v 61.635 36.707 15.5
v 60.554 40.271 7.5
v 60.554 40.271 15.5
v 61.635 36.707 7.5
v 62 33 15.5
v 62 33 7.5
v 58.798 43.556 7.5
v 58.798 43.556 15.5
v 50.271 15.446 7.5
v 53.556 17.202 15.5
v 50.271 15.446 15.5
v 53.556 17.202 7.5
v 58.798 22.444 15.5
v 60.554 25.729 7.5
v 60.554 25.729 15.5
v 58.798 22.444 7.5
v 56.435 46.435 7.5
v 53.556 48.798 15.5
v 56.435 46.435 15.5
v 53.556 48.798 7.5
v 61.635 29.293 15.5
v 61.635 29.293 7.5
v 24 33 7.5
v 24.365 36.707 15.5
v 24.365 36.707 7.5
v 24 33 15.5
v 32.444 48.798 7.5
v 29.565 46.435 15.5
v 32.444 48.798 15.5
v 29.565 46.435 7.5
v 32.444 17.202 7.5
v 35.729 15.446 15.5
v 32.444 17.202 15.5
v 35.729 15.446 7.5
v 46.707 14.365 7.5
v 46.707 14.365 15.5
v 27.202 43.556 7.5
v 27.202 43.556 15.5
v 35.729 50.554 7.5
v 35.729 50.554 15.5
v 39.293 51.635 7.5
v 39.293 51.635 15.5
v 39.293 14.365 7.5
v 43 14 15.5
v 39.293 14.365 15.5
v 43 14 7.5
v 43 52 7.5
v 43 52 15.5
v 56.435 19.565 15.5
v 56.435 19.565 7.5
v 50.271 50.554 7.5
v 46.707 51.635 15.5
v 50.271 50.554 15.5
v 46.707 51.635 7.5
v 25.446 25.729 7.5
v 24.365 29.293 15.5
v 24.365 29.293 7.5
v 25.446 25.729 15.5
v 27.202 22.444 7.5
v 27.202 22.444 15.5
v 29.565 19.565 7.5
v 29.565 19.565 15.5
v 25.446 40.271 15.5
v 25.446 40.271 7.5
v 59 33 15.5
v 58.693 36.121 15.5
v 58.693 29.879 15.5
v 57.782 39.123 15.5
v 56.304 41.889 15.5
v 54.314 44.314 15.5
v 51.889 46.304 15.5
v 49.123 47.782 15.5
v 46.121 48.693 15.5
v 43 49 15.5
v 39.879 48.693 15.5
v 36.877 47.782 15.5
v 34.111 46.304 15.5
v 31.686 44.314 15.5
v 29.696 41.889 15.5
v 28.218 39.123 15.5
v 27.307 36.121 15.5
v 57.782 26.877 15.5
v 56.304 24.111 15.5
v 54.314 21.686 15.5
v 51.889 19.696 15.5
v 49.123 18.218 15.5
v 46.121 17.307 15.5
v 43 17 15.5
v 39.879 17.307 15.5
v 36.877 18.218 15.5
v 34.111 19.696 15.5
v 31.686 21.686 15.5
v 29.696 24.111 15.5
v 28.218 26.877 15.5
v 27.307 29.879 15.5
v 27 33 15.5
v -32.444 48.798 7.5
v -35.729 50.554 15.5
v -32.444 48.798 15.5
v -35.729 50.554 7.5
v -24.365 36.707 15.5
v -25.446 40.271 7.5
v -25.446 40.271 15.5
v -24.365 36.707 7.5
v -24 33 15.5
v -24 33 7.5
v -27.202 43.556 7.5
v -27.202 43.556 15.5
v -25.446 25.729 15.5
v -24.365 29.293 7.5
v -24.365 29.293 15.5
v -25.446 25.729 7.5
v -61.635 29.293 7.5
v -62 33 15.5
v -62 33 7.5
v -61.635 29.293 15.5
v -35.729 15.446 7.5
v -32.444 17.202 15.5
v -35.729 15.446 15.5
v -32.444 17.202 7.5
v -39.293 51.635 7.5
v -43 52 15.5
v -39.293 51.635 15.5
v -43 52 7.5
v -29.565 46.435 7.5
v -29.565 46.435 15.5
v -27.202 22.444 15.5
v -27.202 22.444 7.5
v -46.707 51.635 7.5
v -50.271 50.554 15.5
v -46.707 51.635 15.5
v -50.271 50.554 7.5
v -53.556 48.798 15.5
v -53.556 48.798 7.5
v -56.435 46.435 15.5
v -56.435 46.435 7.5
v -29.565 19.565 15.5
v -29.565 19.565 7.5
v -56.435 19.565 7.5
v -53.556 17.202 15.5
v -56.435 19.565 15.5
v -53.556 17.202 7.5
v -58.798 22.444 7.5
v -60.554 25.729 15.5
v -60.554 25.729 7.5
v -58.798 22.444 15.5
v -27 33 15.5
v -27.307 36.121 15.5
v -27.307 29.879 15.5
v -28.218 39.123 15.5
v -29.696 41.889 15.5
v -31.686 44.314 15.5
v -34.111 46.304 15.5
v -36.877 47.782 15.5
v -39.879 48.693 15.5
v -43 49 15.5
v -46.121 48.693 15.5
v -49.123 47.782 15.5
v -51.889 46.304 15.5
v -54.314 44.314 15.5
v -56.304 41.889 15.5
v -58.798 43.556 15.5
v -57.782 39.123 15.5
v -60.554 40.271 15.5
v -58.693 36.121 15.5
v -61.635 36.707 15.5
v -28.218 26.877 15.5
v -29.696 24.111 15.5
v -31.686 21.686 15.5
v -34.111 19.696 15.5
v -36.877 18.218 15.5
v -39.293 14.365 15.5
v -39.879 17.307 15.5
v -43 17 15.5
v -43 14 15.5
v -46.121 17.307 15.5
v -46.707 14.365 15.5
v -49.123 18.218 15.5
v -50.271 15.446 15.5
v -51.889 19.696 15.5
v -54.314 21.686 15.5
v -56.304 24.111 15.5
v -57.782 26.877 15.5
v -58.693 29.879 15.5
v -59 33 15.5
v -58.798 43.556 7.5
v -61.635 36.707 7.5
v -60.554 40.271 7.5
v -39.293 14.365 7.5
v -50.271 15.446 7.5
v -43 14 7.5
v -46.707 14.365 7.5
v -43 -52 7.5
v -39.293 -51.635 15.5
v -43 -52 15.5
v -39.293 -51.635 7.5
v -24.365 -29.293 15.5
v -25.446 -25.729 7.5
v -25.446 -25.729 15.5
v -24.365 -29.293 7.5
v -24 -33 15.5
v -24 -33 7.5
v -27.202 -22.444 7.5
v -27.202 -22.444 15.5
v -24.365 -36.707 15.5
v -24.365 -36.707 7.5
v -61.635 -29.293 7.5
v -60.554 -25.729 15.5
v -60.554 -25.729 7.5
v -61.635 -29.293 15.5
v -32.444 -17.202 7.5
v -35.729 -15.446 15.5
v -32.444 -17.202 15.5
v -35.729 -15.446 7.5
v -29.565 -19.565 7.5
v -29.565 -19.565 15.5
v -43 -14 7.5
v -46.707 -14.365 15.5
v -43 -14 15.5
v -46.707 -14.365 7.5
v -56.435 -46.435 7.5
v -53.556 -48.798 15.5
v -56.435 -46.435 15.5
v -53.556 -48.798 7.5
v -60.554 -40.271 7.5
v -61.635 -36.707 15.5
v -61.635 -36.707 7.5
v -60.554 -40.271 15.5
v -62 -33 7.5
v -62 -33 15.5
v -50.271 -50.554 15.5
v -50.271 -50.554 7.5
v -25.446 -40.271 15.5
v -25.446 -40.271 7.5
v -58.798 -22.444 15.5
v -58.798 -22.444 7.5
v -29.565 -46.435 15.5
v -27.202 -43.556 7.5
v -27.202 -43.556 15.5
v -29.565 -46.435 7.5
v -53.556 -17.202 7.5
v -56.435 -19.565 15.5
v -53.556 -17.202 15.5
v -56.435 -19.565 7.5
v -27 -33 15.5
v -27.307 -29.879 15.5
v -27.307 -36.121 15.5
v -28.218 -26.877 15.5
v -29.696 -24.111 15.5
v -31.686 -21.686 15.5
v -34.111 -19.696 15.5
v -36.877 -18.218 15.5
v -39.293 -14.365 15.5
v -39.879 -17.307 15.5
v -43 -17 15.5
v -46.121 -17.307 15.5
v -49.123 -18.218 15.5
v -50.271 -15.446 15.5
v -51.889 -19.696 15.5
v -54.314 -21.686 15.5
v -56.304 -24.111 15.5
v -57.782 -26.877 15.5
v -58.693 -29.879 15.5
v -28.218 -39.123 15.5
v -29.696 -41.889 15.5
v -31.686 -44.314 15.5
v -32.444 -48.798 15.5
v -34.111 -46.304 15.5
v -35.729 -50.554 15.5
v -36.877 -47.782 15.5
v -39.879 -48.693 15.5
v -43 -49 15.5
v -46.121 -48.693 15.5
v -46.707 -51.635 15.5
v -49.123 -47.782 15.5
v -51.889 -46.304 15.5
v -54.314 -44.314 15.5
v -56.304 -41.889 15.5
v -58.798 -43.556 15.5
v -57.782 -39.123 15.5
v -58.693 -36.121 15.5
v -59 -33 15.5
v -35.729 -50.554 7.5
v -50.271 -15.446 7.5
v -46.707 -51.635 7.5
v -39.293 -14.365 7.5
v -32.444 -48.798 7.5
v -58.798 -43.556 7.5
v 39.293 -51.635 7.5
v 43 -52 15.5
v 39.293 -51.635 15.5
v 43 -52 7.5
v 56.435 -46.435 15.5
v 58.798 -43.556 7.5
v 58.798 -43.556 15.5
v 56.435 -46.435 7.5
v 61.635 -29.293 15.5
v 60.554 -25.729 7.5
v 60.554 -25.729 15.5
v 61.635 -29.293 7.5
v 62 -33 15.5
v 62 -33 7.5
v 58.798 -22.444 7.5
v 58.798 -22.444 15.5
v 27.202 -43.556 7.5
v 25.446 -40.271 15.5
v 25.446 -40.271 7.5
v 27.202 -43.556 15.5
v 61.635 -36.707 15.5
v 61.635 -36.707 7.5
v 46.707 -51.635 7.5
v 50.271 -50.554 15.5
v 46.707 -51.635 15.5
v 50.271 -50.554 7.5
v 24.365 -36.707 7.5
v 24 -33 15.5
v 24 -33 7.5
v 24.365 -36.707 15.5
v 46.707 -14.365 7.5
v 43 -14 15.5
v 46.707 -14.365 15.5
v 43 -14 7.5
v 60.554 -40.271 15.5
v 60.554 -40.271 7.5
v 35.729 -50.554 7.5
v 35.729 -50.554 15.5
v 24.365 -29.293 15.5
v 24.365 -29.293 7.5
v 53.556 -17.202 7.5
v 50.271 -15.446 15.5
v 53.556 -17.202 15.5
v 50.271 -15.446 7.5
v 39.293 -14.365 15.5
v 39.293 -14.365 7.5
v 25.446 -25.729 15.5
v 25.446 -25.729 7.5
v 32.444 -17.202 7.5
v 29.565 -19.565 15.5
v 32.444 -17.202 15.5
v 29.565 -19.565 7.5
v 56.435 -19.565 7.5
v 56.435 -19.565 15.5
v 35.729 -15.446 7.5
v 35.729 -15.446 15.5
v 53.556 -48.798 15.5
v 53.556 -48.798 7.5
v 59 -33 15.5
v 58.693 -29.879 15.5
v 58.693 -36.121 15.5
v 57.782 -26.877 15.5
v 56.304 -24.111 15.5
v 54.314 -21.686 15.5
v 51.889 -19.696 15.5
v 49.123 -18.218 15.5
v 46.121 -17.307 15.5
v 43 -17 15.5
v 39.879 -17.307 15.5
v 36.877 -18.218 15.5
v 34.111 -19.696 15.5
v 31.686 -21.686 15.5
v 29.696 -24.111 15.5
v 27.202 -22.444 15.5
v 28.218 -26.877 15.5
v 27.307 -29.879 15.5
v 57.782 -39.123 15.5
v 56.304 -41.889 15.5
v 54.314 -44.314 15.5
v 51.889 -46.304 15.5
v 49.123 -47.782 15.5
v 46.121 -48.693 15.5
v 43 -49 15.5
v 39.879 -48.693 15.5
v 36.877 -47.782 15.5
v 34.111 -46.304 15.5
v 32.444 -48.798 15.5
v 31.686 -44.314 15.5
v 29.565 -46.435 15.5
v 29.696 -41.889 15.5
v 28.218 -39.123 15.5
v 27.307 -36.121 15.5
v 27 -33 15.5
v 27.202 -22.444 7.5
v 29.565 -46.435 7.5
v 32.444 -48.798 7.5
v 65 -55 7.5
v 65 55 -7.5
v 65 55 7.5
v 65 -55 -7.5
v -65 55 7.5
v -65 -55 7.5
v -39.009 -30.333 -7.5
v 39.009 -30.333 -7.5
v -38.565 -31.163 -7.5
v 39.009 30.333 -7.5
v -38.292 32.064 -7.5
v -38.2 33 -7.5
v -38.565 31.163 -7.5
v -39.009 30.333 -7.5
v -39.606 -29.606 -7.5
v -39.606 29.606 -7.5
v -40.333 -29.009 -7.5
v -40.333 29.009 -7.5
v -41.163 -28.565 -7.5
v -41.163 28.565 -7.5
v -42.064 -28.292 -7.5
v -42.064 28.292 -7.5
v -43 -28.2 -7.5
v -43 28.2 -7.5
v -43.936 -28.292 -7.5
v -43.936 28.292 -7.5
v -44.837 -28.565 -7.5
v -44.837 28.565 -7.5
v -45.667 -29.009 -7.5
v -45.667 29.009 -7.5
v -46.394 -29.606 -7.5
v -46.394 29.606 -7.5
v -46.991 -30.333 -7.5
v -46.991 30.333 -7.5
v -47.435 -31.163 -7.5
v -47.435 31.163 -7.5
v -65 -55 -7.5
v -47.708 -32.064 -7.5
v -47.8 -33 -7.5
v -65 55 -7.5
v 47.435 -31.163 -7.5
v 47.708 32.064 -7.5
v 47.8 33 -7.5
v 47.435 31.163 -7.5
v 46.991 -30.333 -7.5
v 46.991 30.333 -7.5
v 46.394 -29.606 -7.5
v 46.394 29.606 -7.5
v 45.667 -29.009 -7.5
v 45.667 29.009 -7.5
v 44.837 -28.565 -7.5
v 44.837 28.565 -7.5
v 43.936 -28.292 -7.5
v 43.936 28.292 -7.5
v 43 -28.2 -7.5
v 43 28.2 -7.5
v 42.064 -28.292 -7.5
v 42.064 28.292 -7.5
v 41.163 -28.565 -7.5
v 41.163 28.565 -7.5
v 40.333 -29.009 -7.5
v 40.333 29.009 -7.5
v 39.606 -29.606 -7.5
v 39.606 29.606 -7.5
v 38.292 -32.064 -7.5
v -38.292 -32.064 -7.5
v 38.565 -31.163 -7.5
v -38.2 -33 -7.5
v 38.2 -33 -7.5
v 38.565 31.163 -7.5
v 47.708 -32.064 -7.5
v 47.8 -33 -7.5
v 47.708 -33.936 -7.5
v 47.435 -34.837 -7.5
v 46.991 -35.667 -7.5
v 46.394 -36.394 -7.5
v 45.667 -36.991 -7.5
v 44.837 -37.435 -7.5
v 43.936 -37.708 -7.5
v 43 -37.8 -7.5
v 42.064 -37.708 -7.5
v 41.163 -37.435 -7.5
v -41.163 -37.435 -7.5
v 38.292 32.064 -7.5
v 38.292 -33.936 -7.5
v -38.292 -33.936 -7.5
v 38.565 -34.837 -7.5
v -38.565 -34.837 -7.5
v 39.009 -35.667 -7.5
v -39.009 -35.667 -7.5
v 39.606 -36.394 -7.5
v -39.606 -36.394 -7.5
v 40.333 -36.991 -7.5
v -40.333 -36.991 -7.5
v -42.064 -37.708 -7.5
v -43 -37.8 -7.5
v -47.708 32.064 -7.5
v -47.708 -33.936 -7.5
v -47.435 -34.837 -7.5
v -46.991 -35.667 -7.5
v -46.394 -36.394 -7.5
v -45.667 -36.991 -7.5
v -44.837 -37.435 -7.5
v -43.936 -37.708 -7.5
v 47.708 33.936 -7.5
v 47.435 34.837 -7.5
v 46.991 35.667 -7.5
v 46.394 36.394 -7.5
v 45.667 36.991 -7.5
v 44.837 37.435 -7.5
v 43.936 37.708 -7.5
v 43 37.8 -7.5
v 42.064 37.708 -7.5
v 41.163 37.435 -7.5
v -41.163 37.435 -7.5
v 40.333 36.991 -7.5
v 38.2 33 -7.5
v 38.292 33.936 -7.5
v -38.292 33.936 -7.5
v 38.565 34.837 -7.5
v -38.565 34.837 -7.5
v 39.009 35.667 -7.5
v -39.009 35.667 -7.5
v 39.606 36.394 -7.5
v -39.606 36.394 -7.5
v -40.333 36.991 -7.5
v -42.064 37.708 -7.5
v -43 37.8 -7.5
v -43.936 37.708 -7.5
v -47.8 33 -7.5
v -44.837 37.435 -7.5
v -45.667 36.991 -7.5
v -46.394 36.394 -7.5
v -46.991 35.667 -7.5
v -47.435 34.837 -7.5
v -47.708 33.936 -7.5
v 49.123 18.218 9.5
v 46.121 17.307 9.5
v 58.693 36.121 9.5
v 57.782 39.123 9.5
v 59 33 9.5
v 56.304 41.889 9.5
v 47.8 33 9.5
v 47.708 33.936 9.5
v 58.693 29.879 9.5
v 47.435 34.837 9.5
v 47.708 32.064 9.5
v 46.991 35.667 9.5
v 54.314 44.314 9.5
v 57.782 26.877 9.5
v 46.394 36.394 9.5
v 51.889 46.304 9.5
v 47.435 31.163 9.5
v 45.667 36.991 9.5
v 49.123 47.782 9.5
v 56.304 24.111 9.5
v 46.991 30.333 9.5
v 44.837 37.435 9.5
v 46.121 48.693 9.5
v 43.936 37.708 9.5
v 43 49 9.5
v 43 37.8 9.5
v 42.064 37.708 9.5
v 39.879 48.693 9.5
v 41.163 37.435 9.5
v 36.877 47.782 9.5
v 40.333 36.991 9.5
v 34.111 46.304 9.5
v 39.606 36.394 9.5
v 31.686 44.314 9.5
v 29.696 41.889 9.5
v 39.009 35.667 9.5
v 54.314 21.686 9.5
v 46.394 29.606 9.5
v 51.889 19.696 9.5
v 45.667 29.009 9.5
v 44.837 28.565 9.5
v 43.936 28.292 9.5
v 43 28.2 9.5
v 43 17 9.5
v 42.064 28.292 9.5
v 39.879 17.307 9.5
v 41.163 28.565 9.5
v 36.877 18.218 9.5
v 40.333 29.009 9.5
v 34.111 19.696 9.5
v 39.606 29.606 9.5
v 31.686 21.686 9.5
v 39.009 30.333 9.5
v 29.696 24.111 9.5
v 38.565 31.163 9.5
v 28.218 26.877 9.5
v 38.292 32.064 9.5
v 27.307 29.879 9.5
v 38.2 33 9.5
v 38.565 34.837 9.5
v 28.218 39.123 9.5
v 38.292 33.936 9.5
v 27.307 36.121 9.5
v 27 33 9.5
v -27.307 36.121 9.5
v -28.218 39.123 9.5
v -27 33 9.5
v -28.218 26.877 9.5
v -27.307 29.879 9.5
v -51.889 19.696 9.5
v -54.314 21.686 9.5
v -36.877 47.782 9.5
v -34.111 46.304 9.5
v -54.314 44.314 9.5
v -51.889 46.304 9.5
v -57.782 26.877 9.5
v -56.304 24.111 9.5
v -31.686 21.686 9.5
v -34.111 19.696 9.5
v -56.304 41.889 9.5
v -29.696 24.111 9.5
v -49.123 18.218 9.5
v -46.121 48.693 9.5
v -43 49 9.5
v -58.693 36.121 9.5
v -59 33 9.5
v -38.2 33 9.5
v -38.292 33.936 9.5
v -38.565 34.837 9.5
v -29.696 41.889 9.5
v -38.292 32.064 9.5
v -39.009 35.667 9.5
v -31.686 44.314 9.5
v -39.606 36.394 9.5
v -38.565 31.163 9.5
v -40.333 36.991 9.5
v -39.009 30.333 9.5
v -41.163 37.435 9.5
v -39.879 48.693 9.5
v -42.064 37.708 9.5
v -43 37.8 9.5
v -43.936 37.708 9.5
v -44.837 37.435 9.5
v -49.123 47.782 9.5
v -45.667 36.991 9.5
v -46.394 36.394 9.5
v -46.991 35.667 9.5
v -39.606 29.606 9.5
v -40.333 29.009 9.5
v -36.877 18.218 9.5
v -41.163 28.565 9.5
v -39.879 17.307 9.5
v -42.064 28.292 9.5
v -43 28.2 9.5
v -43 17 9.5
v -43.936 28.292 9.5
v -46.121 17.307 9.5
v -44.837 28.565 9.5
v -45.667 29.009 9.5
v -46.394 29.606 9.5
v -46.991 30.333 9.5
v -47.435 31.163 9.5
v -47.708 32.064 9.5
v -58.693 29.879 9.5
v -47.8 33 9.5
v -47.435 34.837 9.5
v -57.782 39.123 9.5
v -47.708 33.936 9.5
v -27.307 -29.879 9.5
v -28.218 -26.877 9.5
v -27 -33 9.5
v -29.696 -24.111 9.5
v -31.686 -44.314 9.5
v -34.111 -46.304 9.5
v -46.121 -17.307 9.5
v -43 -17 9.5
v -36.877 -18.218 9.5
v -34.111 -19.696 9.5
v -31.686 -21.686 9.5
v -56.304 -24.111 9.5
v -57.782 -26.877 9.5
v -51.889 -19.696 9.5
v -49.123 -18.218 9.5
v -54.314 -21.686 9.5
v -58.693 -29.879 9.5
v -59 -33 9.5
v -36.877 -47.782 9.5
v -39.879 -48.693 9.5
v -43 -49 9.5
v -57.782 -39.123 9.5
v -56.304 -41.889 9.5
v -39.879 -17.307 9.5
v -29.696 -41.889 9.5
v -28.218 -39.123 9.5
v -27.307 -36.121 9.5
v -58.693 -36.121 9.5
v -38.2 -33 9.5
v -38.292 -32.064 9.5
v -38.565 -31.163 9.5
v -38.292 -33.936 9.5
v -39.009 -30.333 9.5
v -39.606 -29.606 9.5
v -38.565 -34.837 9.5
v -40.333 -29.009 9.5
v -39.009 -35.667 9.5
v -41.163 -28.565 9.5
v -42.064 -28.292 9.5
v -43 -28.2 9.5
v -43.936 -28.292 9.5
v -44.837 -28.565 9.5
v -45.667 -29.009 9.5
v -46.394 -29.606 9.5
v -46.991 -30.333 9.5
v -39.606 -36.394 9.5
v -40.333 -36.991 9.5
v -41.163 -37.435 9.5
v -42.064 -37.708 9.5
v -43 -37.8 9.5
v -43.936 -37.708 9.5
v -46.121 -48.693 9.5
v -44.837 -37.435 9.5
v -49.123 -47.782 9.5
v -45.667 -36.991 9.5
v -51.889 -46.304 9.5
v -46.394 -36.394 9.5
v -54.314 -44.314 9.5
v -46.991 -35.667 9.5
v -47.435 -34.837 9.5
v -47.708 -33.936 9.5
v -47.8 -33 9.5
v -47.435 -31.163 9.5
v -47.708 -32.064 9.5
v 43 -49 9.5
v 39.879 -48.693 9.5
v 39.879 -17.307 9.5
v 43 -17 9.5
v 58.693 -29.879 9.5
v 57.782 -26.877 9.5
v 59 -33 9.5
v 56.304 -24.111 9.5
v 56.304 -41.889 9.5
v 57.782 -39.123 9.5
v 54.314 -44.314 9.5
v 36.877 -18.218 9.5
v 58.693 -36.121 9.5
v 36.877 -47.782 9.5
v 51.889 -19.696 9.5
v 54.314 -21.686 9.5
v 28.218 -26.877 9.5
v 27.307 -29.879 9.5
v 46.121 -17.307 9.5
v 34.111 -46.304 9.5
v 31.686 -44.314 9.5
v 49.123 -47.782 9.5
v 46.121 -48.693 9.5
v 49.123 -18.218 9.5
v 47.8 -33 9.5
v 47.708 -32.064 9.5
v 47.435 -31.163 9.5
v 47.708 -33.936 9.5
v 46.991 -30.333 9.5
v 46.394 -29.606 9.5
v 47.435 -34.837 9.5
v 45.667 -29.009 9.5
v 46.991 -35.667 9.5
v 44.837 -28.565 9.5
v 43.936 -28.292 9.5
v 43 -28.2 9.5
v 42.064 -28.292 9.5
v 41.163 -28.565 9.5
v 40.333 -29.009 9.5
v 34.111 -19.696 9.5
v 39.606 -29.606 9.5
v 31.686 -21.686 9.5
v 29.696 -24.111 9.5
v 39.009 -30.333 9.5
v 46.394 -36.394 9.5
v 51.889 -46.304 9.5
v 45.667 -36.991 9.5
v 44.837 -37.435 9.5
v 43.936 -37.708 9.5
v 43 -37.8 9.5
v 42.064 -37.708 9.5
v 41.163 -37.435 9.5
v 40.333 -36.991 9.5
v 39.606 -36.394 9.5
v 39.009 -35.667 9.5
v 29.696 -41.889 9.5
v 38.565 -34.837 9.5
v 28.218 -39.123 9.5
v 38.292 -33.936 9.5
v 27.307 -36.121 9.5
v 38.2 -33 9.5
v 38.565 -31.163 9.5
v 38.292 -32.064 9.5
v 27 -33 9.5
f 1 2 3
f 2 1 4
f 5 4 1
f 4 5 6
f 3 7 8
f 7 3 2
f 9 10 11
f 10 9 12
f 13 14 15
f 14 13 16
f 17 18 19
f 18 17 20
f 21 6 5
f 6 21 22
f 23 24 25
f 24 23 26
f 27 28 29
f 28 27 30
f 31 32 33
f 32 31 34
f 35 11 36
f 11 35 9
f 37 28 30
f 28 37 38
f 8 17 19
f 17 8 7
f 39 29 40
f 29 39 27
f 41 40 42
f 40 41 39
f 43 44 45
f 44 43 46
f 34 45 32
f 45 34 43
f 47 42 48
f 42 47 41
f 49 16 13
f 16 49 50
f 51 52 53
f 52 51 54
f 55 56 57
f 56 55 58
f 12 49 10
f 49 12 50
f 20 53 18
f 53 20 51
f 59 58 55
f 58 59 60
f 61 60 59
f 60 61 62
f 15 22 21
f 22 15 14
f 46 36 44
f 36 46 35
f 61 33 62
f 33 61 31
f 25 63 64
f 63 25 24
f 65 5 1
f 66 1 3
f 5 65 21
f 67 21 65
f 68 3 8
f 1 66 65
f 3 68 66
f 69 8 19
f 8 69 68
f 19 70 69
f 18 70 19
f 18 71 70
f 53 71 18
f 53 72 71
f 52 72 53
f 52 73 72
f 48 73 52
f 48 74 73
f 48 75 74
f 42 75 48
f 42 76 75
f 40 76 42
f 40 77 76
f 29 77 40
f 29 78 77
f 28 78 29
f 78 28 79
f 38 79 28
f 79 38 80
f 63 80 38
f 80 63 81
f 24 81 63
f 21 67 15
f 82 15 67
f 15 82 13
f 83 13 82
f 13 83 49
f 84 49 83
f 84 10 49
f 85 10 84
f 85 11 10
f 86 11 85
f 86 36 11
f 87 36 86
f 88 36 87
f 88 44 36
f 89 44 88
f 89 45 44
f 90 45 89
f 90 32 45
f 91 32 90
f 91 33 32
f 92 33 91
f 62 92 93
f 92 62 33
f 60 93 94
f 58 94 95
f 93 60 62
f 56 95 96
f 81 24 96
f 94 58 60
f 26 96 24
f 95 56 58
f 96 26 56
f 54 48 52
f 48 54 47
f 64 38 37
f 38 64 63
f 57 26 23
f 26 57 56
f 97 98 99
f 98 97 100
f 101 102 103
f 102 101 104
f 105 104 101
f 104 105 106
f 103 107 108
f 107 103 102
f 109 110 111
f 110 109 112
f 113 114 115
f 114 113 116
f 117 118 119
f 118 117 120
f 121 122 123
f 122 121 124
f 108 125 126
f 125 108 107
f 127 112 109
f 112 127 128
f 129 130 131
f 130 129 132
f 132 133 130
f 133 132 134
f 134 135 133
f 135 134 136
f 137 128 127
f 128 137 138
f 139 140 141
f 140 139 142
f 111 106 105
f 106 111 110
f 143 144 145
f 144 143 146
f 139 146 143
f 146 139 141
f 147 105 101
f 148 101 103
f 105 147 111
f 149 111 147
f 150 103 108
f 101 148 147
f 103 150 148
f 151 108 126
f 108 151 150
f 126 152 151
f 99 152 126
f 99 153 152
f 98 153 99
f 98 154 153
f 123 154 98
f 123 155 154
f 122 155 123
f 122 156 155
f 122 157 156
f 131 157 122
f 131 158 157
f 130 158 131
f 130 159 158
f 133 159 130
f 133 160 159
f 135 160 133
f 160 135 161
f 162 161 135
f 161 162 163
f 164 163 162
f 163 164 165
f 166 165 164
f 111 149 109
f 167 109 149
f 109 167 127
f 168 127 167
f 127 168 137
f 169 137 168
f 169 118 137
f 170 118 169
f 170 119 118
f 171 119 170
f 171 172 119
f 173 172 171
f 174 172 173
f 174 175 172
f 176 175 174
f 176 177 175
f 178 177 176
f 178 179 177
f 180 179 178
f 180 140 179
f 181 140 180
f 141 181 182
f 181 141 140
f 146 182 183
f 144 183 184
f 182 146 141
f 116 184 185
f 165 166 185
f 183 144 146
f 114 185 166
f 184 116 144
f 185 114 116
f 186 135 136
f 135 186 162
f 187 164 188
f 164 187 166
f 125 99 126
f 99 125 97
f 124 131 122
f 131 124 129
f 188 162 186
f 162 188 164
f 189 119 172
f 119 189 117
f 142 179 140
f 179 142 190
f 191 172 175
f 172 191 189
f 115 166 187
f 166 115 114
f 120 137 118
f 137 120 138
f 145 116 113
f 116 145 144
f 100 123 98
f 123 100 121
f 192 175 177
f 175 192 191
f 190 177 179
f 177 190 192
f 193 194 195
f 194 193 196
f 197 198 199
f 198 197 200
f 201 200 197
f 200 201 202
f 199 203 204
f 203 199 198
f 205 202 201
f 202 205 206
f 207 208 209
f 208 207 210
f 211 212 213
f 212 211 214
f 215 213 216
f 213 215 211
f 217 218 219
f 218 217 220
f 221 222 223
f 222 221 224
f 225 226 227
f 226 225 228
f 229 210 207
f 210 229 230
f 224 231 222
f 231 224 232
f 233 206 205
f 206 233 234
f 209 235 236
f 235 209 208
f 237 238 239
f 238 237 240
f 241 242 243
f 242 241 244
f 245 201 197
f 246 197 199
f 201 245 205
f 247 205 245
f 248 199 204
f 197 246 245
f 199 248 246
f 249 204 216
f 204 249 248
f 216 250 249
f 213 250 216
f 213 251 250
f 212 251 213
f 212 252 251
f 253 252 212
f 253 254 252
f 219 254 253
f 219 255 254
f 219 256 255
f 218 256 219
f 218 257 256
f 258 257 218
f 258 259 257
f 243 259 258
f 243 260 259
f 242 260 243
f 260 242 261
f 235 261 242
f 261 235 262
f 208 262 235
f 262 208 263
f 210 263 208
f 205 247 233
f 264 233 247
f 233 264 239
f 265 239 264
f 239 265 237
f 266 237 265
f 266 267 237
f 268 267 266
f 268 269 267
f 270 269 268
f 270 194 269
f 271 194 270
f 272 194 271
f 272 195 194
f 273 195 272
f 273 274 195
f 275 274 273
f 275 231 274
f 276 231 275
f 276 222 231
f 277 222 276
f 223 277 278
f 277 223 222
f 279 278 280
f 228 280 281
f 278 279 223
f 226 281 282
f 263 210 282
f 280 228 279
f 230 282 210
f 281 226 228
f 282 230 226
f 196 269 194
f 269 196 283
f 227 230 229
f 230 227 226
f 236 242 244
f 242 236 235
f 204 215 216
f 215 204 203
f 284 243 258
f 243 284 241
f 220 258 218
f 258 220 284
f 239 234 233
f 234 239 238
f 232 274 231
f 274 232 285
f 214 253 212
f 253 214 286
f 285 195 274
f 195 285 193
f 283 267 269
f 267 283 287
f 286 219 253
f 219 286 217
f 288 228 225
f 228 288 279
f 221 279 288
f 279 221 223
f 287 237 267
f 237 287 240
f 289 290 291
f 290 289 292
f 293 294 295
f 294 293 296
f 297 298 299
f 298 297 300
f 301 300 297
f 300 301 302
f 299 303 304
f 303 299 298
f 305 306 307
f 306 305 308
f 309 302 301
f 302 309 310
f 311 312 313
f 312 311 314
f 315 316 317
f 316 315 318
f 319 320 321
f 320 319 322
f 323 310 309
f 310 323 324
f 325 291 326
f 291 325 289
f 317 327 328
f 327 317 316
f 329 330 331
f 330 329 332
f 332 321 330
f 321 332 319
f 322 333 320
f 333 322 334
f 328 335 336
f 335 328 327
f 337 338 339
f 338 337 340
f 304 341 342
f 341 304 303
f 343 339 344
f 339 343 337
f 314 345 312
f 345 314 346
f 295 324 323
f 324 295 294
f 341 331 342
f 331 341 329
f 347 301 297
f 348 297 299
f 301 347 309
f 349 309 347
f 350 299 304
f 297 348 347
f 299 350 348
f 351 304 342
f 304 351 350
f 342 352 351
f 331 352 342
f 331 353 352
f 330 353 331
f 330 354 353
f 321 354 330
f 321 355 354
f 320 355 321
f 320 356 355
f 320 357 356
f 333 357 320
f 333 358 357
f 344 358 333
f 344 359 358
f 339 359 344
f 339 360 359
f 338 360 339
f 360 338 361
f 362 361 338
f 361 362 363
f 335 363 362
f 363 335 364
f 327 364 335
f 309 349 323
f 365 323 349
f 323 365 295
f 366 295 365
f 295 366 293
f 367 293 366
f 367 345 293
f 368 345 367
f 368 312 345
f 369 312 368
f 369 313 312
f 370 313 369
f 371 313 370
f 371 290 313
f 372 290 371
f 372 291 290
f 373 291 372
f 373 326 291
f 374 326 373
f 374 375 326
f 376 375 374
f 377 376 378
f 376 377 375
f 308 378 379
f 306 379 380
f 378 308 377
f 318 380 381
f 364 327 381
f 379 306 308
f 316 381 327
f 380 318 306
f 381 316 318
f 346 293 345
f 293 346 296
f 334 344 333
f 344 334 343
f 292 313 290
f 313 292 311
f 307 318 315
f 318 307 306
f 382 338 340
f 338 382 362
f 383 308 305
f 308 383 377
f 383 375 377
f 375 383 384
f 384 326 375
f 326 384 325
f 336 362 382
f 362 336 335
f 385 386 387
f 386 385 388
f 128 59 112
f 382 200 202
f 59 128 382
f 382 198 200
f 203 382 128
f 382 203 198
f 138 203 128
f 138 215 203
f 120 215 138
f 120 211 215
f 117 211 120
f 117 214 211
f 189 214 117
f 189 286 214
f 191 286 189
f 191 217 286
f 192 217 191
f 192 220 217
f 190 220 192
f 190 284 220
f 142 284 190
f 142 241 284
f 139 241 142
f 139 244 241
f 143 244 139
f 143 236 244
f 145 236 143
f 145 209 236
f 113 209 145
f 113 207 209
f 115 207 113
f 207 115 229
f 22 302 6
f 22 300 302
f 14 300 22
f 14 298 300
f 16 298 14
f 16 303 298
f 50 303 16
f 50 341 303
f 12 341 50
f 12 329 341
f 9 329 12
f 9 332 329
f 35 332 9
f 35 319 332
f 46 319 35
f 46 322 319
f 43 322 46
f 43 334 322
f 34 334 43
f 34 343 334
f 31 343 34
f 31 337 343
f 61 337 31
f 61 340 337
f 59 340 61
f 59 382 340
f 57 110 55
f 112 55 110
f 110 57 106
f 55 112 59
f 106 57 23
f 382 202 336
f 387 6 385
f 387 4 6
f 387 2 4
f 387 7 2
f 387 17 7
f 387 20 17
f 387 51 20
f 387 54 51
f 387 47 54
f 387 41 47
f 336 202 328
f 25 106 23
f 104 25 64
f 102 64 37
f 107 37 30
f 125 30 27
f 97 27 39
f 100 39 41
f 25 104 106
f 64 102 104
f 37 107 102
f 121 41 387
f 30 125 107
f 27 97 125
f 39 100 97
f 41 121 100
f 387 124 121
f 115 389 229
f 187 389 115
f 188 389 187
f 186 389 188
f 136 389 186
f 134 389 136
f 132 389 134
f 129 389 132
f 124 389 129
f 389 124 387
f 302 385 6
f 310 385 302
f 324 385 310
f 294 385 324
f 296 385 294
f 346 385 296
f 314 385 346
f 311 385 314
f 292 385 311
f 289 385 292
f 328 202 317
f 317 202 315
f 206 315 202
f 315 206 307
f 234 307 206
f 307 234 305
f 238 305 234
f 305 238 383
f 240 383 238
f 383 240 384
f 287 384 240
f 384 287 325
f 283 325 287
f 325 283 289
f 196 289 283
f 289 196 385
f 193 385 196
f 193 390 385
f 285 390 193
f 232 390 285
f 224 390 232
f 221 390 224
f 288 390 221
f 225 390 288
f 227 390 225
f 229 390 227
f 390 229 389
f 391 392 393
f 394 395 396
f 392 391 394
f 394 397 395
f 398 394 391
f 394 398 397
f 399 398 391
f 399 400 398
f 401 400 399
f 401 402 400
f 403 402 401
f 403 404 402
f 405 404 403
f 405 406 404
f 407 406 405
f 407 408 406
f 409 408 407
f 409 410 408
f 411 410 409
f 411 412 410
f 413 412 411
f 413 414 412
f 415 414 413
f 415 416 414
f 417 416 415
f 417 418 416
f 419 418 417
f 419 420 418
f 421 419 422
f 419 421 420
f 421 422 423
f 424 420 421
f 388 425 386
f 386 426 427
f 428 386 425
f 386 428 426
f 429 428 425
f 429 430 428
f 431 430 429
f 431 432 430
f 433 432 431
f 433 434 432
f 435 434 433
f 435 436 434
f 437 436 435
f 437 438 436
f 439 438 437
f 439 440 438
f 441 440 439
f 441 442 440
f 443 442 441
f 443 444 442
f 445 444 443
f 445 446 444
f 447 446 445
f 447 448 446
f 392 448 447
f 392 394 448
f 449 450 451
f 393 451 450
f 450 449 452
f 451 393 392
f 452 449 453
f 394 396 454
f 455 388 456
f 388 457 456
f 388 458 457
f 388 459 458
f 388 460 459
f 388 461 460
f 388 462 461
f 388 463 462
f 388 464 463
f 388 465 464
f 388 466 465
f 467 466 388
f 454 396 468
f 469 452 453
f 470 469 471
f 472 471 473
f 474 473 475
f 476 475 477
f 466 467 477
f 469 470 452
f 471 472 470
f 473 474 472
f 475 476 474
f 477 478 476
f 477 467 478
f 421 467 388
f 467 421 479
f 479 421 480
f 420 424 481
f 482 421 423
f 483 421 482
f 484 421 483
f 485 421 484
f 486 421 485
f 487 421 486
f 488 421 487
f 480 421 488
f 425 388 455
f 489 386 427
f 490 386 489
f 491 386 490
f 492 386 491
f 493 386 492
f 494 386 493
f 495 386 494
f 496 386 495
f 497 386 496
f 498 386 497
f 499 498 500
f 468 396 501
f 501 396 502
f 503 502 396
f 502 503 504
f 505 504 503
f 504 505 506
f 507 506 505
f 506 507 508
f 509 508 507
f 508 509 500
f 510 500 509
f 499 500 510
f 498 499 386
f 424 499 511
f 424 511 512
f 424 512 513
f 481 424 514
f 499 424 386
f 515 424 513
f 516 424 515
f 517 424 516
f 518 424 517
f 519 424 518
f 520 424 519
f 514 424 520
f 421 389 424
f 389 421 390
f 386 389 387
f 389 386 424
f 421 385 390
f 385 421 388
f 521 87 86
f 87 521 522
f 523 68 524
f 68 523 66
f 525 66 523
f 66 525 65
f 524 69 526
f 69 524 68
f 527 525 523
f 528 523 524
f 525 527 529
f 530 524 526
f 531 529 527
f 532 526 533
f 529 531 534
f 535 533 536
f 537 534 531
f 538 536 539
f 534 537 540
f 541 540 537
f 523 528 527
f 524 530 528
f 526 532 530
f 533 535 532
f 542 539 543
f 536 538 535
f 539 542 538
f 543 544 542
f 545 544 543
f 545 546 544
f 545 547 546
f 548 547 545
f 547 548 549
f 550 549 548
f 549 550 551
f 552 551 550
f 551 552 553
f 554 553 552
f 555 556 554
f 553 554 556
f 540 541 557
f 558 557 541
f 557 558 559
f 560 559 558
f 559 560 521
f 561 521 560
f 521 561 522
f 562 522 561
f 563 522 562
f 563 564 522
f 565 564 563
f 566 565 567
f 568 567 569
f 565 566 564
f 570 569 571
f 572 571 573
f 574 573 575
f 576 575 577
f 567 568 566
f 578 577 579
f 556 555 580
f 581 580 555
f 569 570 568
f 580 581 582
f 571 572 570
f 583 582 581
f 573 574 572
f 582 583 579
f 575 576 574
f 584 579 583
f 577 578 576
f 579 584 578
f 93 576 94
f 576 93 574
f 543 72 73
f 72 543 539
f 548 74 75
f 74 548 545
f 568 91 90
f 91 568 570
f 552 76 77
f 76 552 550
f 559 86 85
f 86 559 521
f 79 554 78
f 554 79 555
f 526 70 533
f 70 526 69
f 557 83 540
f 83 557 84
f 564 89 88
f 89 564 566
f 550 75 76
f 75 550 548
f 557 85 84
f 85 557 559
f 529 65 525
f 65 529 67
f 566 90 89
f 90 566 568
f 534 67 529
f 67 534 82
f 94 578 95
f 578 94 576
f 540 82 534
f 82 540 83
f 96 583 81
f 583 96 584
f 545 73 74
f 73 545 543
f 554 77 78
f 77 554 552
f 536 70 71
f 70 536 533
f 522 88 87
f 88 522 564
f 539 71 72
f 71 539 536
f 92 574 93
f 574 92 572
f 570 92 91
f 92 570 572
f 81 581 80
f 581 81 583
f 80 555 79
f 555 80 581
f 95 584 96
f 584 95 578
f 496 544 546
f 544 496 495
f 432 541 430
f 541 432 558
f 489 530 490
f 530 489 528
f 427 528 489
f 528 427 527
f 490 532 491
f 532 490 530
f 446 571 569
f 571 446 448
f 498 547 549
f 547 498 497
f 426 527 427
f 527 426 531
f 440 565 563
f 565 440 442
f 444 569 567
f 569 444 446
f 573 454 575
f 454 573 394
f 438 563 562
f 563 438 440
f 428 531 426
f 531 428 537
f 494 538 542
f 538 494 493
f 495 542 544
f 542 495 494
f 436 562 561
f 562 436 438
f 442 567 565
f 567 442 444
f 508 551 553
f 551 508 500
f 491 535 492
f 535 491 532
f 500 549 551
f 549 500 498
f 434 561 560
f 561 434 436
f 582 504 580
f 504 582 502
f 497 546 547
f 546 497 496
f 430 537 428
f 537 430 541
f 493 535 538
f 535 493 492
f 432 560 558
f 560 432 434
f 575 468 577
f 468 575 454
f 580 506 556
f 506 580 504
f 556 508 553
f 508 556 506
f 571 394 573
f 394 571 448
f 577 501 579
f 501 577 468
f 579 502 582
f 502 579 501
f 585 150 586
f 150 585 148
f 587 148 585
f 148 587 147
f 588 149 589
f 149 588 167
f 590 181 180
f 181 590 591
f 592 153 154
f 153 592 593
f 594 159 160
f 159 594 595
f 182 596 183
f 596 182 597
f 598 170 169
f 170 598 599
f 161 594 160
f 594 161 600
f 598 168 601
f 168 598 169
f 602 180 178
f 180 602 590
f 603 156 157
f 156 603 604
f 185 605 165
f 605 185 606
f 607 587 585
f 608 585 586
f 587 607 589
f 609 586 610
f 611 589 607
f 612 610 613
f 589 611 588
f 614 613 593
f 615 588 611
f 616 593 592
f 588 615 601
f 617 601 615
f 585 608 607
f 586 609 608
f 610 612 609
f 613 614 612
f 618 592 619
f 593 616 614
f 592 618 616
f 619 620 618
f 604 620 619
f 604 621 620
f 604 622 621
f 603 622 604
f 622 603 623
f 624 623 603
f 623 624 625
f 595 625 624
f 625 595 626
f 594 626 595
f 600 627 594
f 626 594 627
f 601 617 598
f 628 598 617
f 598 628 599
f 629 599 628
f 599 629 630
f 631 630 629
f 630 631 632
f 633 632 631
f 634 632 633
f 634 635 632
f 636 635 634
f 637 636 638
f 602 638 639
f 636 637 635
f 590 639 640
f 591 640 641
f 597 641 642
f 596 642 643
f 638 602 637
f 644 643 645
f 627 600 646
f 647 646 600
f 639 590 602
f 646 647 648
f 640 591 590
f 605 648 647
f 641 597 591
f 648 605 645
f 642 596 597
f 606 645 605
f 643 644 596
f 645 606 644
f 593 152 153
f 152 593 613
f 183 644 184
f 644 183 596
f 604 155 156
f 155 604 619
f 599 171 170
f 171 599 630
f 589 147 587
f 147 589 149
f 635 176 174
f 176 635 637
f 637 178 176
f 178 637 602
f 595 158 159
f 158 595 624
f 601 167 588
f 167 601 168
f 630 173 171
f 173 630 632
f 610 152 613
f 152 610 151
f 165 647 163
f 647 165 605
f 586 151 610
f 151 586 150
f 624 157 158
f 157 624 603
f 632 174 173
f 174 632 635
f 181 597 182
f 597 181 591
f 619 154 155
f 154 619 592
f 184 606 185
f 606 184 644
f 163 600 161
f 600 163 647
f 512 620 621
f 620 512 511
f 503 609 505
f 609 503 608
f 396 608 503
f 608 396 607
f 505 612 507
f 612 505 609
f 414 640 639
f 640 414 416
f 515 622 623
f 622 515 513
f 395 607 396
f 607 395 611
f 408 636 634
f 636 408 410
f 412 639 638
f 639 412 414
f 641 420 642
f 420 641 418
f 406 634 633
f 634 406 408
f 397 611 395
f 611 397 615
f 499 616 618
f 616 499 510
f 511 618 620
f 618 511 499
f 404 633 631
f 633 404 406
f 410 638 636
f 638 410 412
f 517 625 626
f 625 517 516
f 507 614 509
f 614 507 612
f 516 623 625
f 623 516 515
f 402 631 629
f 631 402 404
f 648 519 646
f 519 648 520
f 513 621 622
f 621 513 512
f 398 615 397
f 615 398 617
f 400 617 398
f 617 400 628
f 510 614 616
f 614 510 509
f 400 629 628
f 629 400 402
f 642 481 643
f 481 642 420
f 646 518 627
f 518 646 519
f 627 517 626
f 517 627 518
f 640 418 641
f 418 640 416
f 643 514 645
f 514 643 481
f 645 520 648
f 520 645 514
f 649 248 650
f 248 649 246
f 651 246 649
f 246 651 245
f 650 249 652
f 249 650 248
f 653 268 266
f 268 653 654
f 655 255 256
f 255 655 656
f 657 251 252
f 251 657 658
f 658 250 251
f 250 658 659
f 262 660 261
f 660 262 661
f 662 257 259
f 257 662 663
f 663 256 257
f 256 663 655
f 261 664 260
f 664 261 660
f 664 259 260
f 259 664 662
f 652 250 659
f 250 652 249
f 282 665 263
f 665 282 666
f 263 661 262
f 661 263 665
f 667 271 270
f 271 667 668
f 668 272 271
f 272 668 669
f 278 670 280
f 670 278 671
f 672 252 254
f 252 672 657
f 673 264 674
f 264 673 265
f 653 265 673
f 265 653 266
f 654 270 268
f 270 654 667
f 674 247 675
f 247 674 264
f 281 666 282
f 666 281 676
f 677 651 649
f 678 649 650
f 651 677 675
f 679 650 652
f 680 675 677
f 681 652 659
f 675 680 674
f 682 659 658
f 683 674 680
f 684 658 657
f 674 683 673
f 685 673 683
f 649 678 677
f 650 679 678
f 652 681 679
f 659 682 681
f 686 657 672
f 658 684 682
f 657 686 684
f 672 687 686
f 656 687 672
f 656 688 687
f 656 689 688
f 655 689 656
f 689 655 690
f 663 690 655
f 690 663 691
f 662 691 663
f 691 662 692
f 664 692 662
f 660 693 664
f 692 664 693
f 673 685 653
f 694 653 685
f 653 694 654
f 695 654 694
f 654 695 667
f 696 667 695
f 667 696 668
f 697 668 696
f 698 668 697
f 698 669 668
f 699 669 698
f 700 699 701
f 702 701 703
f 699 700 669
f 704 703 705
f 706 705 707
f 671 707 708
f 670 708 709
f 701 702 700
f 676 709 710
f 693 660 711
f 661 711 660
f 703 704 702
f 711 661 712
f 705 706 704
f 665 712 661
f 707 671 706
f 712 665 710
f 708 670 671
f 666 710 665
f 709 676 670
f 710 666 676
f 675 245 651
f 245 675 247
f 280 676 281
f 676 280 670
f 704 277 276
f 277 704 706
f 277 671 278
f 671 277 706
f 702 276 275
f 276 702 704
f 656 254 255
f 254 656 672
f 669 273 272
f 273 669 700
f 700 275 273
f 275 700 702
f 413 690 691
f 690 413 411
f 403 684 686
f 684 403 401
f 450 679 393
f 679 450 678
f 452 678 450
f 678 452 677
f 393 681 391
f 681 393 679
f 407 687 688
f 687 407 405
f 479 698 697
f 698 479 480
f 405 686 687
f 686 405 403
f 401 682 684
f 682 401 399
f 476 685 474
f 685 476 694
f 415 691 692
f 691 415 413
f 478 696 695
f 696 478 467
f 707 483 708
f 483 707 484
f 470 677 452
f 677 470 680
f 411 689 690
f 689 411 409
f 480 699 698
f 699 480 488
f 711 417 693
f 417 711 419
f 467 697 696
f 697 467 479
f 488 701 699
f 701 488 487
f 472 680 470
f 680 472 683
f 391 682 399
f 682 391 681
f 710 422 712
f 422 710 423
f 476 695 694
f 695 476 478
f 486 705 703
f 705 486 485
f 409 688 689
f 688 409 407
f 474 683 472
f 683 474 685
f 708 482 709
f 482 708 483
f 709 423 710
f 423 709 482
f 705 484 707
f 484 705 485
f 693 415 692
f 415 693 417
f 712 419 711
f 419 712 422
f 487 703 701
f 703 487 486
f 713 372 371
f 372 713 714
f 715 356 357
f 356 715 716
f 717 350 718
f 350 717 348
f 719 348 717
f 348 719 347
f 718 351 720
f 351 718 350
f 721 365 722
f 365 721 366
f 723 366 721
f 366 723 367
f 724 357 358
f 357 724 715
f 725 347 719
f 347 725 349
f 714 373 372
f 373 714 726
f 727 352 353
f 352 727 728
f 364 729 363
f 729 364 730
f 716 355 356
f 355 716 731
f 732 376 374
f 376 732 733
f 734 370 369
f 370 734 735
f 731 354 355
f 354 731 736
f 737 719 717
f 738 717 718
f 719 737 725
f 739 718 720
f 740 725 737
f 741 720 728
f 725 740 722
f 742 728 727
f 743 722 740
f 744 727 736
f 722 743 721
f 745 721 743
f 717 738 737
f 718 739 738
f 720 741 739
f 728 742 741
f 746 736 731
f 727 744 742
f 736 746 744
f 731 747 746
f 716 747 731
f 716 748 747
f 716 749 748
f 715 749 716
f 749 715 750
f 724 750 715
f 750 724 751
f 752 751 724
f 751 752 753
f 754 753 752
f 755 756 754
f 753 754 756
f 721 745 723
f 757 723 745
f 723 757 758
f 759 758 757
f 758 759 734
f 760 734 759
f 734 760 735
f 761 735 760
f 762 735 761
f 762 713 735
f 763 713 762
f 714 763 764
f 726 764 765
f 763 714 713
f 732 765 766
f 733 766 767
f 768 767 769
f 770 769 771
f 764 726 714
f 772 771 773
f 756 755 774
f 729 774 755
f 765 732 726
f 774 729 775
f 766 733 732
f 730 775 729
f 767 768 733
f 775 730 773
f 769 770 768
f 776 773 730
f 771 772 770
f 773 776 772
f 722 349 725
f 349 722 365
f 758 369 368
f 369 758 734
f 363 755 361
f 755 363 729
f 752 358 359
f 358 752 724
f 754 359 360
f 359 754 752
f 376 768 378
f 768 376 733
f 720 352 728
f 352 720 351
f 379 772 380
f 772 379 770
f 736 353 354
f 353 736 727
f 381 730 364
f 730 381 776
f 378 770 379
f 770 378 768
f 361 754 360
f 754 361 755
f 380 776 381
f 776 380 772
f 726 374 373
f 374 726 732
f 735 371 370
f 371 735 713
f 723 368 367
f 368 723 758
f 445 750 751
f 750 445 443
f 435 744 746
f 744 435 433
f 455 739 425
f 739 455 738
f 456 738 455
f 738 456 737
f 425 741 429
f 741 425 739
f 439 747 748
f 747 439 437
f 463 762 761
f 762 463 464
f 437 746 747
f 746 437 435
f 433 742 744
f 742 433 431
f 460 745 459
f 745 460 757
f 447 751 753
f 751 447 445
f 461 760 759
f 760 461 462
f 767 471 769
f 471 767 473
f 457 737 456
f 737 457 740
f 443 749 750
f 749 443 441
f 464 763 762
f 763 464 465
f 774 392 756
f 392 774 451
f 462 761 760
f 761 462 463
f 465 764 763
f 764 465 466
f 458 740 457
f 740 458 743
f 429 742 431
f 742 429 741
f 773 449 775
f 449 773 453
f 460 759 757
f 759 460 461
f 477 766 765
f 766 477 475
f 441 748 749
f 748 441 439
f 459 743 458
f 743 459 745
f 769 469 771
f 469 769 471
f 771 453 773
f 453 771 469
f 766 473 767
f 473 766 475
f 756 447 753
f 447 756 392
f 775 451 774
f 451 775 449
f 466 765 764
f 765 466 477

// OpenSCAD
$fn = 32;

// ----------------------------------------------------------------------
// Socket pad plate
// bosses with counterbored sockets for the screws
// ----------------------------------------------------------------------

// --- parameters (mm) ---
base_t = 15;             // base plate thickness
boss_h = 8;              // boss height above the base plate
boss_d = 38;             // boss diameter
socket_d = 32;           // socket diameter
socket_depth = 6;        // socket depth from the boss face
bolt_d = 9.6;            // screw clearance hole through the socket floor
plate = [130, 110, 15];  // overall size (x, y, z)
edge = 22;               // boss centre offset from the plate edge
pads = 4;                // boss count, one per corner

// --- derived feature positions (mm) ---
height = base_t + boss_h;        // = 23   overall height of the part
corner_x = plate[0] / 2 - edge;  // = 43   boss centre X
corner_y = plate[1] / 2 - edge;  // = 33   boss centre Y
feature_centers = [
  [corner_x, corner_y],
  [-corner_x, corner_y],
  [-corner_x, -corner_y],
  [corner_x, -corner_y]
];   // boss centres: sockets, holes and the pads themselves are placed from here

// base plate, bosses on feature_centers, socket + through hole in each
difference() {
  union() {
    cube(plate, center = true);
    for (centre = feature_centers)
      translate([centre[0], centre[1], plate[2] / 2 - 1])
        cylinder(d = boss_d, h = boss_h + 1);
  }
  for (centre = feature_centers) {
    translate([centre[0], centre[1], plate[2] / 2 + boss_h - socket_depth])
      cylinder(d = socket_d, h = socket_depth + 1);
    translate([centre[0], centre[1], -height])
      cylinder(d = bolt_d, h = 2 * height + 2);  // through the socket floor
  }
}
